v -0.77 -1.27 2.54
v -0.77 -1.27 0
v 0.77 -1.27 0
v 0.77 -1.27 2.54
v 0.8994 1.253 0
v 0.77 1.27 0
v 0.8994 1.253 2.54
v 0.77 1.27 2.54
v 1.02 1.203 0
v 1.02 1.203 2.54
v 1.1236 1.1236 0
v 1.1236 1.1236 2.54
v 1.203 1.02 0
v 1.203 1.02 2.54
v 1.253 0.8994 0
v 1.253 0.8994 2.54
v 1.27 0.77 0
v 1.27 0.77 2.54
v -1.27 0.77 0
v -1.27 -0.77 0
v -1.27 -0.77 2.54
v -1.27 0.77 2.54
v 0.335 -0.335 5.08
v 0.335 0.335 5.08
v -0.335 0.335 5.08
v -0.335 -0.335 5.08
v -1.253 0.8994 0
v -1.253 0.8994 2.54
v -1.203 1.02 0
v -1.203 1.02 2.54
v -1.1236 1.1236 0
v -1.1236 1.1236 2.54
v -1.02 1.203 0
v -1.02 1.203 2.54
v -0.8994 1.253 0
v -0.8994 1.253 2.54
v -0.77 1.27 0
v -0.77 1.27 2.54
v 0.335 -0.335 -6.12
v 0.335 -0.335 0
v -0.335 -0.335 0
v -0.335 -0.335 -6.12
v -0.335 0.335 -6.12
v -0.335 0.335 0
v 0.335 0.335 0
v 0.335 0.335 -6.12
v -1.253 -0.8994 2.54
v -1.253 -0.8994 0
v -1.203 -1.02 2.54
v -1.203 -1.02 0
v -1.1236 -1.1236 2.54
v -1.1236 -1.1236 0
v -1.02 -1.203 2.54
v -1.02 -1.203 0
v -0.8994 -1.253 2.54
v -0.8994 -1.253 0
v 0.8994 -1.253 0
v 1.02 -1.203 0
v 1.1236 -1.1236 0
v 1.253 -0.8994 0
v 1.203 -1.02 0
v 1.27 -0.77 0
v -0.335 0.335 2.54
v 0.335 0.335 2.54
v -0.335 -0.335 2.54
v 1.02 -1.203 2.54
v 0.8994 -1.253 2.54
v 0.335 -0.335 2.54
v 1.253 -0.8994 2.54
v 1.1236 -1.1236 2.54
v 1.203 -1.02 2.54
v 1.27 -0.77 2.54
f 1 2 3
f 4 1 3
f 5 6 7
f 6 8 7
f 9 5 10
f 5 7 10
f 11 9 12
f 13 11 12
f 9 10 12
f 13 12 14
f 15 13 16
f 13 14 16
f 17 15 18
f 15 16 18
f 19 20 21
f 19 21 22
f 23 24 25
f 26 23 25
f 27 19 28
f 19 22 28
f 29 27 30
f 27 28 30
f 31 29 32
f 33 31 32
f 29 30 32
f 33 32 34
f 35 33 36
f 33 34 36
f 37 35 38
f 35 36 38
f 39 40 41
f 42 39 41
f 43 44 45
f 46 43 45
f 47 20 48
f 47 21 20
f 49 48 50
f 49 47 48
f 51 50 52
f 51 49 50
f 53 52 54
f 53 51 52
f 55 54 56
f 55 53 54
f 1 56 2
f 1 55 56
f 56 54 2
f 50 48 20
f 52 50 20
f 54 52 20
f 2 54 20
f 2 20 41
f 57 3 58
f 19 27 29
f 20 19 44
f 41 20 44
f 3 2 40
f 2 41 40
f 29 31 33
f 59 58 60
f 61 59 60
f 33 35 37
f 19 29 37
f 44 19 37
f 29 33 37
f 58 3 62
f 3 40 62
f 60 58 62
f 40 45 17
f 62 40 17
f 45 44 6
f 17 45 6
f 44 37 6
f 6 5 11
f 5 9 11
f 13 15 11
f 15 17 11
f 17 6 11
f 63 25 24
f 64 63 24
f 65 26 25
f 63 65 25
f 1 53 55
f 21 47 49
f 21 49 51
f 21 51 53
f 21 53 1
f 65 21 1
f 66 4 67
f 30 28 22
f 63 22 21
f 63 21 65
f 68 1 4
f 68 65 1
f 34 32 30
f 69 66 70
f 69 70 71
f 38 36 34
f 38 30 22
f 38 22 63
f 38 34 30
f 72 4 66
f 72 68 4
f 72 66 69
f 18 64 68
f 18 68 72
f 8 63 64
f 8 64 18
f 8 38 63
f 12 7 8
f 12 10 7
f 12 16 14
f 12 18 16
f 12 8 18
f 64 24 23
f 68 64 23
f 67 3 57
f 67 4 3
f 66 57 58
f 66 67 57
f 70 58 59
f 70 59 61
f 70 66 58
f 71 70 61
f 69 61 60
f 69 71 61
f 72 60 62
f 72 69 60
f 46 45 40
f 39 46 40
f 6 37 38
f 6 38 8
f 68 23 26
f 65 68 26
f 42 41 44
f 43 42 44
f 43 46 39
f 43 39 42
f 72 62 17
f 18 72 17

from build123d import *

# Parameters (mm, degrees)
SKETCH_1_W      = 2.54
SKETCH_1_H      = 2.54
EXTRUDE_1_DEPTH = 2.54
SKETCH_2_W      = 0.67
SKETCH_2_H      = 0.67
FILLET_1_R      = 0.5


with BuildPart() as part:
    # 草图1 → 拉伸1 (new body)
    with BuildSketch(Plane.XY):
        Rectangle(SKETCH_1_W, SKETCH_1_H)
    extrude(amount=EXTRUDE_1_DEPTH)

    # 扫描1: sweep along a path in 草图3
    with BuildLine(Plane(origin=(0, 0, 0), x_dir=(0, 0, -1), z_dir=(1, 0, 0))) as sweep_1_path:
        Line((6.12, -0.01), (-5.08, -0.01))
    # 草图2 → 扫描1 (sweep)
    with BuildSketch(Plane(origin=(0, 0, 5.08), x_dir=(-1, 0, 0), z_dir=(0, 0, -1))):
        Rectangle(SKETCH_2_W, SKETCH_2_H)
    sweep(path=sweep_1_path.line)

    # 圆角1
    fillet_1_edges = [part.edges().sort_by_distance(p)[0] for p in [
        (-1.27, 1.27, 1.27),
        (1.27, 1.27, 1.27),
        (1.27, -1.27, 1.27),
        (-1.27, -1.27, 1.27),
    ]]
    fillet(fillet_1_edges, radius=FILLET_1_R)


solid = part.part
